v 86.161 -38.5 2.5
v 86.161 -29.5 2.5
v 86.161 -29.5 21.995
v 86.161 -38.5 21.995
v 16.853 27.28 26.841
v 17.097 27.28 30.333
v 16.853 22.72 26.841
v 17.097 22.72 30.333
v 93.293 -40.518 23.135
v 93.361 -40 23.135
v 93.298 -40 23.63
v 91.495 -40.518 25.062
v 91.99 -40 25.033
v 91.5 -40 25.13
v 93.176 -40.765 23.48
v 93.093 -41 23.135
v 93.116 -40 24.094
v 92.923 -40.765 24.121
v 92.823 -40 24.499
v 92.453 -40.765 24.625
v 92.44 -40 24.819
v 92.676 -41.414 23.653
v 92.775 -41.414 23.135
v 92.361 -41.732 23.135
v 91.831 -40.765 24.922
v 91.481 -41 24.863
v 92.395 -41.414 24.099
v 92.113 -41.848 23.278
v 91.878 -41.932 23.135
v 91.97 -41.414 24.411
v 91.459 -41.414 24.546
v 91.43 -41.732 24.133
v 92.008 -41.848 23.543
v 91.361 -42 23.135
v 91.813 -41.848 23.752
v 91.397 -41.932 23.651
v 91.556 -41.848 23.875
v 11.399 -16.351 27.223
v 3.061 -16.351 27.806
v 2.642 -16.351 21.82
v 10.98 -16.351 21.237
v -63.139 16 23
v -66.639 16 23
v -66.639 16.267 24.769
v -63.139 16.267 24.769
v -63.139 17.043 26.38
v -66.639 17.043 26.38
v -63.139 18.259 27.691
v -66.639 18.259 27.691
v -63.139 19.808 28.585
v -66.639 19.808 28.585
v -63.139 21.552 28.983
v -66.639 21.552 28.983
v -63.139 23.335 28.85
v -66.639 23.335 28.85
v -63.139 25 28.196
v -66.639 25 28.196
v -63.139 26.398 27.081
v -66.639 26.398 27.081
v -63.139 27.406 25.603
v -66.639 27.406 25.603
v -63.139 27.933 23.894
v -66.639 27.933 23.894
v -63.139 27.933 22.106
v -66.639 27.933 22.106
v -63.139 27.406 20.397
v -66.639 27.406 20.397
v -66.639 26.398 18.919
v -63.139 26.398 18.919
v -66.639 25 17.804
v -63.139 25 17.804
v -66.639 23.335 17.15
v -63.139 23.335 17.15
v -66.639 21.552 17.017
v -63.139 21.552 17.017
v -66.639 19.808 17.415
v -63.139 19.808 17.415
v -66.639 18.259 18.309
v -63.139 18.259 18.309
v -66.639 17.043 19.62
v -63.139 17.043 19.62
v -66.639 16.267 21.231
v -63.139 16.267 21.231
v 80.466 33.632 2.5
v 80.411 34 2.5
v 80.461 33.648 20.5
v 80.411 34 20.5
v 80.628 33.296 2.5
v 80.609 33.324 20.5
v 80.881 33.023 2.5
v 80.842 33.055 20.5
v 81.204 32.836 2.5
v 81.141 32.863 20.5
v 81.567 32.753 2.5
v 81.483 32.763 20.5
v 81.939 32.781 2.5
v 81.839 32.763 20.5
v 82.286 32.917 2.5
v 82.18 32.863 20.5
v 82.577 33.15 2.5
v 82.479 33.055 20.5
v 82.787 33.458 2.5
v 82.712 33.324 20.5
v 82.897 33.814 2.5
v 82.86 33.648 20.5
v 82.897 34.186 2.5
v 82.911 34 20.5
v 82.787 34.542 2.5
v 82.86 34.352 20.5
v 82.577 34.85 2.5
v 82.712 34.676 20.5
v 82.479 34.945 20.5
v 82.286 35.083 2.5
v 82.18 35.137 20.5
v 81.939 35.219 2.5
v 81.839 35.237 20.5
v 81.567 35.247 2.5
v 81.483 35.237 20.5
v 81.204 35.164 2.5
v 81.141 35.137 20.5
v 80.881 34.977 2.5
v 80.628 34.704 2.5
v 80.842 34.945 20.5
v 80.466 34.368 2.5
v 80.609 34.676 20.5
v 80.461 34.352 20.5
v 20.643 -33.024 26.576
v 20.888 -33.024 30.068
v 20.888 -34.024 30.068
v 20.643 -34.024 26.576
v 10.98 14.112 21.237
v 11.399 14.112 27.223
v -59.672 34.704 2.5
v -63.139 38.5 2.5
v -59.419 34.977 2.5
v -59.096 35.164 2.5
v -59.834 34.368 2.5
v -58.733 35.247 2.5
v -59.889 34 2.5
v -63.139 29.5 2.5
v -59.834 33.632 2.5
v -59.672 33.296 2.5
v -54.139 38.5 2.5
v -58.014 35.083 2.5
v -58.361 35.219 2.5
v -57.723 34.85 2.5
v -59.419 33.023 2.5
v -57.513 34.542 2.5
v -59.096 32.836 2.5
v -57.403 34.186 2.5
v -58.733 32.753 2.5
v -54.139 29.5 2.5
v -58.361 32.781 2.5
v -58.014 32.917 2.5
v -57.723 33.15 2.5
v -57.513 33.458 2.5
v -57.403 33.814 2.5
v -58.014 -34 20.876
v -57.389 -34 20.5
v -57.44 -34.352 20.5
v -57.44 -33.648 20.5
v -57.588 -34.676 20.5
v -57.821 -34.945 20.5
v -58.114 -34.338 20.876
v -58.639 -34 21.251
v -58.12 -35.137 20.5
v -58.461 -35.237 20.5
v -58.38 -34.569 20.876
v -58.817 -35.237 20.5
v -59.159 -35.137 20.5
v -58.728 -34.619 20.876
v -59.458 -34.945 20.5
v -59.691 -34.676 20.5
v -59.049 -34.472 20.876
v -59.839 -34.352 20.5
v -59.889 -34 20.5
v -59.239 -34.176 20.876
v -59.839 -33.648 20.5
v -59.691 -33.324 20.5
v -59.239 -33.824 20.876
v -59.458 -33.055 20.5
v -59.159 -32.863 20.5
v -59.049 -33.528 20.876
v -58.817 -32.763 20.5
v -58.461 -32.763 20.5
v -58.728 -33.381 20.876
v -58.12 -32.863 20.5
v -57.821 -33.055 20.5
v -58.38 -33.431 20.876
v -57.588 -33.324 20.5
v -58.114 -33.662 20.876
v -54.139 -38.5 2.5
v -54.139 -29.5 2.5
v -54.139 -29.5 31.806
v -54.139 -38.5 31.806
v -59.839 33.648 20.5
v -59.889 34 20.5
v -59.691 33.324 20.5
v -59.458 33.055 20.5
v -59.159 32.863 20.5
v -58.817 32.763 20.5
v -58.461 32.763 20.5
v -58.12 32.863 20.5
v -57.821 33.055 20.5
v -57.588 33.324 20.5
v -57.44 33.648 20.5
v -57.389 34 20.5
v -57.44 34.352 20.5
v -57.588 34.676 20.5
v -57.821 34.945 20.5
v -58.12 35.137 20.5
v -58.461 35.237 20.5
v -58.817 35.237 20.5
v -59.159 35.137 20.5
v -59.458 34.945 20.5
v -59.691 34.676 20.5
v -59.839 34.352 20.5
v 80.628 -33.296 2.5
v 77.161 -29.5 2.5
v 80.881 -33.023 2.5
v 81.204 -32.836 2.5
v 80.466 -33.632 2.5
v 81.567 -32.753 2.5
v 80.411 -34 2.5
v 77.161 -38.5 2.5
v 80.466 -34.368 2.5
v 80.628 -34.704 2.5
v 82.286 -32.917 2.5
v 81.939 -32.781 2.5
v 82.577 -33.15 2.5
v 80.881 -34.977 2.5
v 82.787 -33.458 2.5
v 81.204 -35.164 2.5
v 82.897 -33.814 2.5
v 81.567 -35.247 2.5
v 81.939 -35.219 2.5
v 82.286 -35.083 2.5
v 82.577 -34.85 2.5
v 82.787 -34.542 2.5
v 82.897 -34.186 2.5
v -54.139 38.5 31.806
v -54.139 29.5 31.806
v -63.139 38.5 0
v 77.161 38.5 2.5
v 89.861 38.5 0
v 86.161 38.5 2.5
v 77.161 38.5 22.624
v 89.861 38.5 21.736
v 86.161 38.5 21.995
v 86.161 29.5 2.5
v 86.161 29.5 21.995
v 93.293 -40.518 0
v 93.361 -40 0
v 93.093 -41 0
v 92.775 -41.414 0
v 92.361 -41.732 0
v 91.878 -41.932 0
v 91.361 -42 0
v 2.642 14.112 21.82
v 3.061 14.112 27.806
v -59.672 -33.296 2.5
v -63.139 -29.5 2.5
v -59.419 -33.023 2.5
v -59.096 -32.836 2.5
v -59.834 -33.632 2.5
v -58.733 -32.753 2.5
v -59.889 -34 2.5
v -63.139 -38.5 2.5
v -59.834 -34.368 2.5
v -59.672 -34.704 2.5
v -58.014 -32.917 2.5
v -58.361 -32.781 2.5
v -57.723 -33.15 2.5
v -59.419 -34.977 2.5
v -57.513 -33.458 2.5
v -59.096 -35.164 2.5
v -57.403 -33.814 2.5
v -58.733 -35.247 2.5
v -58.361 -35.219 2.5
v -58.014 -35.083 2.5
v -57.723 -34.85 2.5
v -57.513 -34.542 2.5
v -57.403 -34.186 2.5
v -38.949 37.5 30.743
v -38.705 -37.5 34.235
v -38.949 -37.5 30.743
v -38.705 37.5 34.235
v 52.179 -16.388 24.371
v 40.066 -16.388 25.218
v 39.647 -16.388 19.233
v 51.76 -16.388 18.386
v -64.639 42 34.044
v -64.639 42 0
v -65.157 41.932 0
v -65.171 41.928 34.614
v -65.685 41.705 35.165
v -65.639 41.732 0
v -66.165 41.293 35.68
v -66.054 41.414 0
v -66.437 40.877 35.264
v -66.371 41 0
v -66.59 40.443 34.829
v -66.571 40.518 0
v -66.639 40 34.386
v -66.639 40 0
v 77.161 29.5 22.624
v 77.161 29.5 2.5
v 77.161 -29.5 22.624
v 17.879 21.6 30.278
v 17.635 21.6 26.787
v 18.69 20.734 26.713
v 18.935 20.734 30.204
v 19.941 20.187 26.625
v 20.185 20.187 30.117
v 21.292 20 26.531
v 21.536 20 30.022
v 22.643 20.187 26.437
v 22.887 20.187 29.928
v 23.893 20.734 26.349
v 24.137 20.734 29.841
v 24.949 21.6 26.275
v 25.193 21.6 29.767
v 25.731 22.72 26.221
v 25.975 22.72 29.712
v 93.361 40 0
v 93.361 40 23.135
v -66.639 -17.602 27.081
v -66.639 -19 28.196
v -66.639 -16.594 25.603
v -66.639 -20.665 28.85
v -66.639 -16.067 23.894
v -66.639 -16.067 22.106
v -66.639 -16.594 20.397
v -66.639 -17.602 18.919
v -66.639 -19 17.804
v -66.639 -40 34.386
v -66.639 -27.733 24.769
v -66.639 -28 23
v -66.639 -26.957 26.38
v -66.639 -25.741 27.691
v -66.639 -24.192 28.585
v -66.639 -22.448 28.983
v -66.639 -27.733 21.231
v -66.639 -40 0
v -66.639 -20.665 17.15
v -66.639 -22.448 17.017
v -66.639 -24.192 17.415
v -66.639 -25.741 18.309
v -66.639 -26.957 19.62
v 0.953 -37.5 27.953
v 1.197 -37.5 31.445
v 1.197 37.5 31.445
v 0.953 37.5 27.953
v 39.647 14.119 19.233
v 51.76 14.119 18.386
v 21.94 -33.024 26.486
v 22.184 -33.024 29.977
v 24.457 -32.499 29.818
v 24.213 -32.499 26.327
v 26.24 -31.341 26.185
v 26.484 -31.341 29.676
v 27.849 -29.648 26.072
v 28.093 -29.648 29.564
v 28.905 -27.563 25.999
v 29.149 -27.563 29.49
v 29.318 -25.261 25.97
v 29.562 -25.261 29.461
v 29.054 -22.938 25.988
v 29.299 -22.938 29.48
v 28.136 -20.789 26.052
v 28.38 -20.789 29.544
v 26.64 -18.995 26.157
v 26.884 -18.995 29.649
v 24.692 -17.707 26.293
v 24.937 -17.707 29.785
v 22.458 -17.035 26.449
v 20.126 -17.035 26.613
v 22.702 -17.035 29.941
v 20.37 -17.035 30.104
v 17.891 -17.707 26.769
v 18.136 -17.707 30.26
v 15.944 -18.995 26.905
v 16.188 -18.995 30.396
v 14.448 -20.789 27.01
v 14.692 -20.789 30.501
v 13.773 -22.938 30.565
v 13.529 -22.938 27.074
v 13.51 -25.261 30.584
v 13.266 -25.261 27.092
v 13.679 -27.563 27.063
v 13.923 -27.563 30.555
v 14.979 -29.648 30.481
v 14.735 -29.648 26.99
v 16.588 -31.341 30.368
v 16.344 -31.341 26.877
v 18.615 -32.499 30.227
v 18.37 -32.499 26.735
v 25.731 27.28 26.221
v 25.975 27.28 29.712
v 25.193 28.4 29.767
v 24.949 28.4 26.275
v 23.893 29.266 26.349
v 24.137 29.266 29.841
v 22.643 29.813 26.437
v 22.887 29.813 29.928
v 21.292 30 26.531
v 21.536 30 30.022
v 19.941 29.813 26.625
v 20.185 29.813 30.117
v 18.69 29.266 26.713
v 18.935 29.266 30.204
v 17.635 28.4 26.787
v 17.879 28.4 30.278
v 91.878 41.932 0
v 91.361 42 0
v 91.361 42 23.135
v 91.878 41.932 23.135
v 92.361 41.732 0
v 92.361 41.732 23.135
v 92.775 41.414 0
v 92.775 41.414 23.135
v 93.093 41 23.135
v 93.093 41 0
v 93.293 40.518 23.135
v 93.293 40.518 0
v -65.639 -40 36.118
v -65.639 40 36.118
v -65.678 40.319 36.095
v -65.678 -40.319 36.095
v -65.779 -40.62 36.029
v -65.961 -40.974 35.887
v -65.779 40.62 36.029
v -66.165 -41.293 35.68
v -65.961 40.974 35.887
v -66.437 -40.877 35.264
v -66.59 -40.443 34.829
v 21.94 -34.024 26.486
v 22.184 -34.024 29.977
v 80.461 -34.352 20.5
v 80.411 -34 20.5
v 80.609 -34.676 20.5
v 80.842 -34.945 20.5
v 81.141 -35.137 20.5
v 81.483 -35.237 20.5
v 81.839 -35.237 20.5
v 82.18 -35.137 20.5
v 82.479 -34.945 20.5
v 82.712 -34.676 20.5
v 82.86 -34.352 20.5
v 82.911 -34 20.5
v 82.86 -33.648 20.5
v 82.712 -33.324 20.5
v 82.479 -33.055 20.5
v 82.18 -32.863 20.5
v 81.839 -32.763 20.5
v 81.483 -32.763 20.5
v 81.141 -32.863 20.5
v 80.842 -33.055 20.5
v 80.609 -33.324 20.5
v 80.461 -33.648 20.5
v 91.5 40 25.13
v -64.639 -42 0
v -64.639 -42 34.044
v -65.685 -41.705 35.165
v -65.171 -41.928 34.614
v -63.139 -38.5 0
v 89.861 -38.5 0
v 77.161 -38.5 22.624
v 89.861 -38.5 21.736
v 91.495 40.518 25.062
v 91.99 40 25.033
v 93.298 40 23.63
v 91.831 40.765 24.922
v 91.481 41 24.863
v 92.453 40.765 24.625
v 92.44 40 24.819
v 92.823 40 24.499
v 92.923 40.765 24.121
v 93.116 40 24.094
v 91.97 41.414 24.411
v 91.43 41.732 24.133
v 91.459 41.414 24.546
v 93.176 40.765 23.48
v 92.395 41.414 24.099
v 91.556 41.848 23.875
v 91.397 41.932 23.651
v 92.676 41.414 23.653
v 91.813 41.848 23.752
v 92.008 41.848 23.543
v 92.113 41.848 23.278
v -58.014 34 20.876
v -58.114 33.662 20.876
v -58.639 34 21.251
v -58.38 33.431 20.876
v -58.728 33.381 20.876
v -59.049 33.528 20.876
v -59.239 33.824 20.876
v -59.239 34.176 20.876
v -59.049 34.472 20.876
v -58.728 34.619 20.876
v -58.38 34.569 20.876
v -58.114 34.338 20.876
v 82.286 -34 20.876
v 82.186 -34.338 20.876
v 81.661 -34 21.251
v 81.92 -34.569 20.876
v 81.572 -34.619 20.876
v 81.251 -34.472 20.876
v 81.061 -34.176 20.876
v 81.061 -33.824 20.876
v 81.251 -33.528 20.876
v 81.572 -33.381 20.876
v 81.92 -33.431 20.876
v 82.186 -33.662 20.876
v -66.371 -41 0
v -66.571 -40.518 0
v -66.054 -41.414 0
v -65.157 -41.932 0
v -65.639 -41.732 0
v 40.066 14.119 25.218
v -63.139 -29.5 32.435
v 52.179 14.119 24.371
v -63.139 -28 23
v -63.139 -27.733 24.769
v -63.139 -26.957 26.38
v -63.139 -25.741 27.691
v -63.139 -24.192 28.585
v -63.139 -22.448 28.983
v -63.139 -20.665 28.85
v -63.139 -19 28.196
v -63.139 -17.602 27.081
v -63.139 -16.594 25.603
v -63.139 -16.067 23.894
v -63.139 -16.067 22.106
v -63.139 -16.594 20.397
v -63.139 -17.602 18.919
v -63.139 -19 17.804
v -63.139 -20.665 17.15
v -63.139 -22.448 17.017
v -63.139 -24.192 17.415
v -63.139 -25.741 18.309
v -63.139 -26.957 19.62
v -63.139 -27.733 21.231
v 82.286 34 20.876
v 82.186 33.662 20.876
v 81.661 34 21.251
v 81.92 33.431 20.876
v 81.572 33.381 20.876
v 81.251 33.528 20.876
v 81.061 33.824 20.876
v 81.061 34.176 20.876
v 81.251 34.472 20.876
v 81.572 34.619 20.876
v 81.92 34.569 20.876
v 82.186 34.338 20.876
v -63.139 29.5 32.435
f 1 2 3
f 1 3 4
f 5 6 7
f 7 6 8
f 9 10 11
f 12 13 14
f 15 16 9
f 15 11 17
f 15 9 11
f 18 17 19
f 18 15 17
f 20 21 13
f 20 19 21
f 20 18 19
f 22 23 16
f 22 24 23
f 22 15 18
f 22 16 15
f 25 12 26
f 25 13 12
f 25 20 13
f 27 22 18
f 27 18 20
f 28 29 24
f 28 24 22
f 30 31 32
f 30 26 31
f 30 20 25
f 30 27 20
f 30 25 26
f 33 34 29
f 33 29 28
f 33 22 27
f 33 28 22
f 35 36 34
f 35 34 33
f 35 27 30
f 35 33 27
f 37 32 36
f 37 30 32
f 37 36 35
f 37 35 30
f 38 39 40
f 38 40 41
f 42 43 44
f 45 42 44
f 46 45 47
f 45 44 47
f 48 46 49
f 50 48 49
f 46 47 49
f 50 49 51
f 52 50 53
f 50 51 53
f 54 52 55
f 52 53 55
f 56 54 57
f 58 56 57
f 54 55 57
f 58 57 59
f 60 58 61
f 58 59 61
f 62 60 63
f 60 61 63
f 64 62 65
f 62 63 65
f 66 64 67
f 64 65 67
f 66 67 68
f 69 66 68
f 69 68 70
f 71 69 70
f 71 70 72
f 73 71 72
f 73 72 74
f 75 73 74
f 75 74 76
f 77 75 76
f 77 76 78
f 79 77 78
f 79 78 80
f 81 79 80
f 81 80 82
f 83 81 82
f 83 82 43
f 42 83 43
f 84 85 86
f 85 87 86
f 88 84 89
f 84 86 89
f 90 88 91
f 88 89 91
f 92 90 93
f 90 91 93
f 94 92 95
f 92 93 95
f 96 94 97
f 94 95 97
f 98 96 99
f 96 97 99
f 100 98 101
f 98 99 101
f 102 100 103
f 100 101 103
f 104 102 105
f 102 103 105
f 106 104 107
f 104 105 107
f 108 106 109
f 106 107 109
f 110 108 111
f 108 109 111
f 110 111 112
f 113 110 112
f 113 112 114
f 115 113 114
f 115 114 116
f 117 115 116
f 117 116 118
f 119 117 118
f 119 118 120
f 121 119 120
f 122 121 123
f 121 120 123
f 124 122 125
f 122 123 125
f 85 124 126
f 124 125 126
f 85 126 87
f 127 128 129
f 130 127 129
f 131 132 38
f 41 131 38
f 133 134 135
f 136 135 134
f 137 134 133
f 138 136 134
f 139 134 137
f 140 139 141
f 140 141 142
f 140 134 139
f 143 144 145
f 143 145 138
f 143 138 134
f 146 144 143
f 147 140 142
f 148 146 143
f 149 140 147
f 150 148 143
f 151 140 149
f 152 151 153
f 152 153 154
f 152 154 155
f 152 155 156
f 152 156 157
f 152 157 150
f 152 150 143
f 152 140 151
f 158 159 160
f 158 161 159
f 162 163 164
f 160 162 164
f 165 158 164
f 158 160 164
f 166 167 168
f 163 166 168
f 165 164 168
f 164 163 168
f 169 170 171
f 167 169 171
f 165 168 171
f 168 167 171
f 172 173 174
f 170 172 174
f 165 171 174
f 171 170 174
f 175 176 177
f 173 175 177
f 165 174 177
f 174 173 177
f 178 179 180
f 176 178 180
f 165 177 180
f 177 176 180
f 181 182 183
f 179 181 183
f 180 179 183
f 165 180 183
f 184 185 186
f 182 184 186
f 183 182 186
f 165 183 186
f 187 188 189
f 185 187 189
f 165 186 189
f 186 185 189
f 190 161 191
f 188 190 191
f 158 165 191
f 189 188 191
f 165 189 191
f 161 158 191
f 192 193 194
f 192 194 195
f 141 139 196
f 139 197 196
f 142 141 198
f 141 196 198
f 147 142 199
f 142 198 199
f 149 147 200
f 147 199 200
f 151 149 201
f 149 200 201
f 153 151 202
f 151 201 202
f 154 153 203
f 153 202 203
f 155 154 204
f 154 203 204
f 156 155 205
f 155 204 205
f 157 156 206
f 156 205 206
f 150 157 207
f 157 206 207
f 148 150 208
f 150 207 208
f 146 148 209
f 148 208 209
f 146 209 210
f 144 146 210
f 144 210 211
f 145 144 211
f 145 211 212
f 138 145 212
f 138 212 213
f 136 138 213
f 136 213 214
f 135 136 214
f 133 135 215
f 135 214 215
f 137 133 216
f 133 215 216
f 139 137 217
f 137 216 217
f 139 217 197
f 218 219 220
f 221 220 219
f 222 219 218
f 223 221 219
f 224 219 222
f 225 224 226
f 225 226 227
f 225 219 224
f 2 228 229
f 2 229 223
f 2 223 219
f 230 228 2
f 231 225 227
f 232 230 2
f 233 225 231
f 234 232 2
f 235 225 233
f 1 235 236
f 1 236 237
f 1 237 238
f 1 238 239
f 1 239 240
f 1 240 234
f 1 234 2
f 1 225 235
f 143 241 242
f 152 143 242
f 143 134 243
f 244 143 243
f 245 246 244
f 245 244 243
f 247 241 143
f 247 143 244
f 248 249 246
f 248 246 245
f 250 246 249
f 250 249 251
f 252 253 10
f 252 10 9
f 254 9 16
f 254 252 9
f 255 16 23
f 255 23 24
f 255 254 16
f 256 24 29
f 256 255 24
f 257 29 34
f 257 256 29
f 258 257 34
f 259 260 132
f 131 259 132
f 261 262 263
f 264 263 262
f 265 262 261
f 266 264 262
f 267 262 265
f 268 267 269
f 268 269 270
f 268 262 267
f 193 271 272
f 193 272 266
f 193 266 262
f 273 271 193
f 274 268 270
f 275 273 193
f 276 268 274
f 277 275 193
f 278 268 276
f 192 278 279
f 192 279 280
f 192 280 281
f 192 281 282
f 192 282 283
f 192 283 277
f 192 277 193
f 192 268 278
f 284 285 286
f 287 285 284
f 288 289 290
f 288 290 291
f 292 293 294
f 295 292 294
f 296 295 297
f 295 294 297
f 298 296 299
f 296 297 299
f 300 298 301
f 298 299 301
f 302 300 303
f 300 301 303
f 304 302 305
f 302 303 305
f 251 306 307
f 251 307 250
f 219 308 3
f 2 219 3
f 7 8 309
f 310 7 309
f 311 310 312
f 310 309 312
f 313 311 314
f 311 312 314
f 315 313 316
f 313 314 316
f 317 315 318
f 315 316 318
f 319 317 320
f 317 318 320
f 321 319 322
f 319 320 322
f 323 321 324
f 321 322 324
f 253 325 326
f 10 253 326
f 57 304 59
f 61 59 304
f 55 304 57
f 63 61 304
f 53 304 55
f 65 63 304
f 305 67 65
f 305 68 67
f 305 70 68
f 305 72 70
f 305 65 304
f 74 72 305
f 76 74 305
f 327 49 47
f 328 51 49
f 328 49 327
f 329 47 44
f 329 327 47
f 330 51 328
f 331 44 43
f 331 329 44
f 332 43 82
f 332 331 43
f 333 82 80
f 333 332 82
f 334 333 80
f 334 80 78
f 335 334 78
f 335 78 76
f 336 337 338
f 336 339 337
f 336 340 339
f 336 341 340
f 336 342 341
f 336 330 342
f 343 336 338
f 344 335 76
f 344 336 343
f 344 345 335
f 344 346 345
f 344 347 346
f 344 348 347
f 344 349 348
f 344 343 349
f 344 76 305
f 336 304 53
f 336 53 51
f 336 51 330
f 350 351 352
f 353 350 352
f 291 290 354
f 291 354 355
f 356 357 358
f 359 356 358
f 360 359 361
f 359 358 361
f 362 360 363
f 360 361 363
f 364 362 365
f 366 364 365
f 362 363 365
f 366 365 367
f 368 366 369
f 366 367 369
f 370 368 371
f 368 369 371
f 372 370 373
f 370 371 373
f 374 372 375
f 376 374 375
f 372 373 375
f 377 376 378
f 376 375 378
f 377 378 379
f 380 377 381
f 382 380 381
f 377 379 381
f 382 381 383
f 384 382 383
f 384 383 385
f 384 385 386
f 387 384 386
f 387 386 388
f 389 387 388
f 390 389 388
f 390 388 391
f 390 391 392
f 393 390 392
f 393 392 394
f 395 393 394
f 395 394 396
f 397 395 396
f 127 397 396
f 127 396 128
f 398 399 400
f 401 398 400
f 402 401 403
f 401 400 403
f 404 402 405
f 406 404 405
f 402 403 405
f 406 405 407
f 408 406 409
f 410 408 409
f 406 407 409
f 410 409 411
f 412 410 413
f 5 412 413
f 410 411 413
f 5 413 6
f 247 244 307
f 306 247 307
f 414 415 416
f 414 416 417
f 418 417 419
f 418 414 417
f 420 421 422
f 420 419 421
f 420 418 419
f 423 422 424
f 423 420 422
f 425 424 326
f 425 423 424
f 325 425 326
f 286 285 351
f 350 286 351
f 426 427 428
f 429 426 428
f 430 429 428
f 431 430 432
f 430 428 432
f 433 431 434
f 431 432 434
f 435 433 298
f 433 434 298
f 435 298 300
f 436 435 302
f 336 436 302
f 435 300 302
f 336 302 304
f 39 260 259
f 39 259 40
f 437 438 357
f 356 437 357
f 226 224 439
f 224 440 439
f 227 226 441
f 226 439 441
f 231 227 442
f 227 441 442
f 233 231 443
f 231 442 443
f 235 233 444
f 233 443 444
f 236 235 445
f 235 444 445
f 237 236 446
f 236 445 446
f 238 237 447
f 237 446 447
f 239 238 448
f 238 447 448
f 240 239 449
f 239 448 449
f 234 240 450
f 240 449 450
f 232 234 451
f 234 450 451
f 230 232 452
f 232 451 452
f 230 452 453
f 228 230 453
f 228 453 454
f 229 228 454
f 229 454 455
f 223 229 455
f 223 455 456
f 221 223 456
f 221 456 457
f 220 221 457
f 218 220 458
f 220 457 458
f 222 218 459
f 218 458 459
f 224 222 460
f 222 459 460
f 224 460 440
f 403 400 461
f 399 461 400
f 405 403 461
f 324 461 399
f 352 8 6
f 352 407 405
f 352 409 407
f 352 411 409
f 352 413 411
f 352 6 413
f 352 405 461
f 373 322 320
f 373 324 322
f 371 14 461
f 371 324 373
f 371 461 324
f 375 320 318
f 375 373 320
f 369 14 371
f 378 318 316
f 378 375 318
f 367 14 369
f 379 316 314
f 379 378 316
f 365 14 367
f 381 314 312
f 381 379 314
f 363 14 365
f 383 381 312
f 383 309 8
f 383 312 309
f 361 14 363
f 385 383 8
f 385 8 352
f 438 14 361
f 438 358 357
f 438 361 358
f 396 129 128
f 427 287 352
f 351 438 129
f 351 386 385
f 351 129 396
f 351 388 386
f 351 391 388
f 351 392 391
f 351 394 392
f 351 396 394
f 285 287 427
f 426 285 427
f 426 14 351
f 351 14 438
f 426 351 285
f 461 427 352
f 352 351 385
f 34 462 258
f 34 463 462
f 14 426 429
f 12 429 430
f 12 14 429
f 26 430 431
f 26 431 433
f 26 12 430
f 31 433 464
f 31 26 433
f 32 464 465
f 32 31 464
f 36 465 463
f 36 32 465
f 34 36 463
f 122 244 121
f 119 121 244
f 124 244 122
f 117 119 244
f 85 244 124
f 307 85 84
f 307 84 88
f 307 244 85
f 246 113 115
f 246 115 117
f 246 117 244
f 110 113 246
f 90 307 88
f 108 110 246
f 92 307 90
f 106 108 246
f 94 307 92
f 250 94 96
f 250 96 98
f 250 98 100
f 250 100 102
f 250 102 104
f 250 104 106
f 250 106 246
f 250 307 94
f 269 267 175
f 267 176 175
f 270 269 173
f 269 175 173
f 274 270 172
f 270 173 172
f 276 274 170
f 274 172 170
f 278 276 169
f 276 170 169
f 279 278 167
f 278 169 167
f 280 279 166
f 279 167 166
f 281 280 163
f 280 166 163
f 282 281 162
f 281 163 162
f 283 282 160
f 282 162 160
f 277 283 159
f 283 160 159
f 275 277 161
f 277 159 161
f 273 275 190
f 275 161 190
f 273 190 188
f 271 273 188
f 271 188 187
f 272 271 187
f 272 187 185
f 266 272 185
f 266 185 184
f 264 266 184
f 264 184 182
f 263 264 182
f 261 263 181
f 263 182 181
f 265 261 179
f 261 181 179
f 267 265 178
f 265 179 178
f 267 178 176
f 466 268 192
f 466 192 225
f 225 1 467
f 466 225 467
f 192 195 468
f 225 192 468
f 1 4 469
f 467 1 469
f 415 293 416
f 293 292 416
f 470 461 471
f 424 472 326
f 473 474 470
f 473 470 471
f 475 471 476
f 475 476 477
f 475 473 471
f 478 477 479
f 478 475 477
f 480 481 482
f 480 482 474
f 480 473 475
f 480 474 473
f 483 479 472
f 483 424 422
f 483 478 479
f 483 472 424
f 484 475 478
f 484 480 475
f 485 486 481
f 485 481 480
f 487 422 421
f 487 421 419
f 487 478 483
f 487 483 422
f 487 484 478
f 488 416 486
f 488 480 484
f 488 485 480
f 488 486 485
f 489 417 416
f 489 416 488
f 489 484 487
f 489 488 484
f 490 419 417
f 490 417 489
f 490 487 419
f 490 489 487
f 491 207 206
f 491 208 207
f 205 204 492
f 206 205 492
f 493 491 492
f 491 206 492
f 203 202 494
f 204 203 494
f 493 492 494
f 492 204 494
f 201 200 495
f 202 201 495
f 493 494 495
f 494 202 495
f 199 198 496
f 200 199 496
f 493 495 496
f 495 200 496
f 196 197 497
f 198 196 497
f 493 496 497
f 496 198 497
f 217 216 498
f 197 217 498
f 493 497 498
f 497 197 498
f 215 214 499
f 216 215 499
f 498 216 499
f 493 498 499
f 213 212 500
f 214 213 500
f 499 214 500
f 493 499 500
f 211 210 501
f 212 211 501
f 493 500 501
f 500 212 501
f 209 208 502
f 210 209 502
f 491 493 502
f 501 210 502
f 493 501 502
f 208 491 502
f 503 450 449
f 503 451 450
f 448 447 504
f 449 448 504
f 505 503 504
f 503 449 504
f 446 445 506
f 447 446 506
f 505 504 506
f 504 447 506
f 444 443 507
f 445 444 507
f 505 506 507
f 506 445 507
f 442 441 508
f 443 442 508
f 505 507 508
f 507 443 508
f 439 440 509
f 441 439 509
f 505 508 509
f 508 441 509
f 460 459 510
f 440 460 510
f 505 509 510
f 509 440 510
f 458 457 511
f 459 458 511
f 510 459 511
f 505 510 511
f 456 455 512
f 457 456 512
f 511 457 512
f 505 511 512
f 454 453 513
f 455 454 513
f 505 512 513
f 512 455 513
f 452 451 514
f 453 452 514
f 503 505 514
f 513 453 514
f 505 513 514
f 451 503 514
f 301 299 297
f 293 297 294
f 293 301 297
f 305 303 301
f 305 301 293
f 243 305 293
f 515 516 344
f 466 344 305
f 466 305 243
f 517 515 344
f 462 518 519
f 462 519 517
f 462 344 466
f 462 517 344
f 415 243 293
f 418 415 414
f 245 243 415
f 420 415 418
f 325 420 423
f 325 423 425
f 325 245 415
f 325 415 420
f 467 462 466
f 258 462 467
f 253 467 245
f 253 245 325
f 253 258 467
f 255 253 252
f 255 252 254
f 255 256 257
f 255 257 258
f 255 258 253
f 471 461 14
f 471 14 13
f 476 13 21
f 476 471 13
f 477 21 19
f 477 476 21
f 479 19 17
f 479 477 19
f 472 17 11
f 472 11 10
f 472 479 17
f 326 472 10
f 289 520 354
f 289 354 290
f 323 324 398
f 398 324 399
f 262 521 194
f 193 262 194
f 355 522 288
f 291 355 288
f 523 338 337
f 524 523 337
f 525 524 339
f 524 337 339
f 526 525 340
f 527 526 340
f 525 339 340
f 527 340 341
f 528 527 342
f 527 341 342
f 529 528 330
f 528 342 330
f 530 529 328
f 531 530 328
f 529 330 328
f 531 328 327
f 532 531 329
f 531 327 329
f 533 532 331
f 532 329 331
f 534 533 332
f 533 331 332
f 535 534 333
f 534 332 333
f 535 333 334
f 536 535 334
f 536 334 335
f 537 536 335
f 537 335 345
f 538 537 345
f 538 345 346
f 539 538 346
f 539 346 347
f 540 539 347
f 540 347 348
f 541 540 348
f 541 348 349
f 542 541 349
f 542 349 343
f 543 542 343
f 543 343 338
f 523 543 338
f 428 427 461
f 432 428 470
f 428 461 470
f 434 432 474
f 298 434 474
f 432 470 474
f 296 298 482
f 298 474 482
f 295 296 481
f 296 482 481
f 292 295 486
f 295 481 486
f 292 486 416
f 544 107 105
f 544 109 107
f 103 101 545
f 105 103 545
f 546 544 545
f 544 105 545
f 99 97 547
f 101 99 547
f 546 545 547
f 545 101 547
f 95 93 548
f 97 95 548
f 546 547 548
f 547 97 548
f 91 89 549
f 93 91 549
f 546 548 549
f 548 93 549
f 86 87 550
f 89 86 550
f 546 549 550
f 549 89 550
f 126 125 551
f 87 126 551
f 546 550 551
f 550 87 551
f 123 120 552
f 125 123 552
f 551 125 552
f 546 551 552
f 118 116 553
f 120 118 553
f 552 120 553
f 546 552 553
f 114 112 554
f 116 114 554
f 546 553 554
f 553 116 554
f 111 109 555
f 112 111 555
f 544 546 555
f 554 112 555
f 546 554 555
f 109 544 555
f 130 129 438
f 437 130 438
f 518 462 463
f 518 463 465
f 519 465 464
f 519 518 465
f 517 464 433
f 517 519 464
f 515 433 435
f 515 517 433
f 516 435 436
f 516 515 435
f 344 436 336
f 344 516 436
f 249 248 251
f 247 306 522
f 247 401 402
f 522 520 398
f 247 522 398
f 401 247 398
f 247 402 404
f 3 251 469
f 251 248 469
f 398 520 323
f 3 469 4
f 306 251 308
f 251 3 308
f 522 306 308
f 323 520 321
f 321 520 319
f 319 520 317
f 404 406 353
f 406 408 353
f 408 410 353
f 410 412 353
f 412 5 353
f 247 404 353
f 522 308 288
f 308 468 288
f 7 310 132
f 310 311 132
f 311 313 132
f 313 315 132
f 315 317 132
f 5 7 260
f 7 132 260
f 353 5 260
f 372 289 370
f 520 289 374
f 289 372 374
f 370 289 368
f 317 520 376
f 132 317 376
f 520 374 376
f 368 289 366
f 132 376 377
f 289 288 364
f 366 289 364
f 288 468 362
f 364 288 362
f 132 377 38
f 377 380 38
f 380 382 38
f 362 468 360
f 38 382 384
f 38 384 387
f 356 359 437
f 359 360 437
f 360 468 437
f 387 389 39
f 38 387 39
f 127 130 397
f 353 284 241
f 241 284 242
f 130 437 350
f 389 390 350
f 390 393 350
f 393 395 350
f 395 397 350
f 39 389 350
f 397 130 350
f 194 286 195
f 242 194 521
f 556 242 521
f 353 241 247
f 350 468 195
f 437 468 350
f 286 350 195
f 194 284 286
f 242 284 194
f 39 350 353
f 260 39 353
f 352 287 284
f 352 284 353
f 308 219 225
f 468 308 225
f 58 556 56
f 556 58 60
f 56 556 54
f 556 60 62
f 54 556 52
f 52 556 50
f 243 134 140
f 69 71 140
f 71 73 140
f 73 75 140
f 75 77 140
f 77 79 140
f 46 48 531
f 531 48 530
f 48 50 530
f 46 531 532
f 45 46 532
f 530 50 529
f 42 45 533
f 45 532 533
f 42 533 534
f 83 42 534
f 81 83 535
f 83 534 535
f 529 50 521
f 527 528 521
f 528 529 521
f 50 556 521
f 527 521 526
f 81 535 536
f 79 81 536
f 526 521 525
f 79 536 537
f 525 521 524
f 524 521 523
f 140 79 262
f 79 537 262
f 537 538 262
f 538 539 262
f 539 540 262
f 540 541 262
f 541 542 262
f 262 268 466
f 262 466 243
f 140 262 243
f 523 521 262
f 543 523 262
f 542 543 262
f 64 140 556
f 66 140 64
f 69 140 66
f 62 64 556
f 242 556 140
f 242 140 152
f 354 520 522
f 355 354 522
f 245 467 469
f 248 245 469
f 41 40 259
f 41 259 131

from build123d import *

# Parameters (mm, degrees)
F1_DEPTH      = 42
F2_T          = -3.5
F3_W          = 40
F3_H          = 75
F4_DEPTH      = 4
F6_DEPTH      = 5
F8_W          = 9
F8_H          = 9
F9_DEPTH      = 20.5
F10_DEPTH     = 32
F12_R         = 6
F13_DEPTH     = 25
F15_W         = 8.3580343053
F15_H         = 30.4632759653
F15_W_2       = 12.1421813965
F15_H_2       = 30.5070821196
F16_DEPTH     = 6
F17_T1_DEPTH  = 169.3882617949
F17_T3_DEPTH  = 92.6602540378
F17_T5_DEPTH  = 46.118363099
F17_T7_DEPTH  = 35
F18_D         = 2.5
F18_DEPTH     = 18
F18_TIP       = 0.7510757738
F19_T1_DEPTH  = 80
F19_T6_DEPTH  = 2
F19_T12_DEPTH = 2
F20_D         = 2.5
F20_DEPTH     = 18
F20_TIP       = 0.7510757738


# Not quite as in the source:
# - a fillet or chamfer that OpenCascade refuses, or shapes differently, is made with other operations: its cross-section is extruded or revolved along the edge and cut away or added
# - a feature names something its author has since deleted; it is built from what else it names


with BuildPart() as f1:
    # F0 (on Front) → F1 (new body, symmetric)
    with BuildSketch(Plane.XZ):
        Polygon((-66.6393345791, 36.118363099), (-66.6393345791, 0), (93.3606654209, 0), (93.3606654209, 25), (-65.6393345791, 36.118363099), align=None)
    extrude(amount=F1_DEPTH, both=True)

    # F2
    f2_openings = [f1.faces().sort_by_distance(p)[0] for p in [
        (13.360665, 0, 0),
    ]]
    offset(amount=F2_T, openings=f2_openings)

    # F3 (on face) → F4 (cut)
    with BuildSketch(Plane(origin=(2.1939535511, 0, 31.3749975164), x_dir=(0.9975640503, 0, -0.0697564737), z_dir=(0.0697564737, 0, 0.9975640503))):
        with Locations((-20.9989301063, 0)):
            Rectangle(F3_W, F3_H)
    extrude(amount=-F4_DEPTH, mode=Mode.SUBTRACT)

    # F3 (on face) → F6 (cut)
    with BuildSketch(Plane(origin=(2.1939535511, 0, 31.3749975164), x_dir=(0.9975640503, 0, -0.0697564737), z_dir=(0.0697564737, 0, 0.9975640503))):
        with BuildLine():
            Line((14.9393316886, 27.279802623), (14.9393316886, 22.720197377))
            ThreePointArc((14.9393316886, 22.720197377), (19.3893316886, 20), (23.8393316886, 22.720197377))
            Line((23.8393316886, 22.720197377), (23.8393316886, 27.279802623))
            ThreePointArc((23.8393316886, 27.279802623), (19.3893316886, 30), (14.9393316886, 27.279802623))
        make_face()
        with BuildLine():
            Line((20.0393316886, -34.0238362551), (20.0393316886, -33.0238362551))
            ThreePointArc((20.0393316886, -33.0238362551), (19.3893316886, -16.9498789917), (18.7393316886, -33.0238362551))
            Line((18.7393316886, -33.0238362551), (18.7393316886, -34.0238362551))
            Line((18.7393316886, -34.0238362551), (20.0393316886, -34.0238362551))
        make_face()
    extrude(amount=-F6_DEPTH, mode=Mode.SUBTRACT)

    # F8 (on offset) → F9 (join)
    with BuildSketch(Plane(origin=(0, 0, 2.5), x_dir=(1, 0, 0), z_dir=(0, 0, -1))):
        with Locations((81.6606654209, 34)):
            Rectangle(F8_W, F8_H)
        with Locations((81.6606654209, -34)):
            Rectangle(F8_W, F8_H)
    extrude(amount=-F9_DEPTH)

    # F8 (on offset) → F10 (join)
    with BuildSketch(Plane(origin=(0, 0, 2.5), x_dir=(1, 0, 0), z_dir=(0, 0, -1))):
        with Locations((-58.6393345791, -34)):
            Rectangle(F8_W, F8_H)
        with Locations((-58.6393345791, 34)):
            Rectangle(F8_W, F8_H)
    extrude(amount=-F10_DEPTH)

    # F12 (on offset) → F13 (cut)
    with BuildSketch(Plane(origin=(-66.6393345791, 0, 0), x_dir=(0, -1, 0), z_dir=(-1, 0, 0))):
        with Locations((-22, 23)):
            Circle(F12_R)
        with Locations((22, 23)):
            Circle(F12_R)
    extrude(amount=-F13_DEPTH, mode=Mode.SUBTRACT)

    # F15 (on offset) → F16 (join)
    with BuildSketch(Plane(origin=(1.949805893, 0, 27.8835233405), x_dir=(0.9975640503, 0, -0.0697564737), z_dir=(-0.0697564737, 0, -0.9975640503))):
        with Locations((5.292899441, 1.1196539272)):
            Rectangle(F15_W, F15_H)
        with Locations((44.2803874612, 1.1346279643)):
            Rectangle(F15_W_2, F15_H_2)
    extrude(amount=F16_DEPTH)

    # F17: fillet of radius 2 on 7 edges, made by hand

    # F17_s2 → F17_t1 (cut)
    with BuildSketch(Plane(origin=(96.1545321211, 0, -6.7237798852), x_dir=(0, 1, 0), z_dir=(-0.9975640503, 0, 0.0697564737))):
        with BuildLine():
            ThreePointArc((40, -31.4516120627), (41.4142135624, -30.865825625), (42, -29.4516120627))
            Line((42, -29.4516120627), (42, -31.4516120627))
            Line((42, -31.4516120627), (40, -31.4516120627))
        make_face()
        with BuildLine():
            ThreePointArc((-40, -31.4516120627), (-41.4142135624, -30.865825625), (-42, -29.4516120627))
            Line((-42, -29.4516120627), (-42, -31.4516120627))
            Line((-42, -31.4516120627), (-40, -31.4516120627))
        make_face()
    extrude(amount=F17_T1_DEPTH, mode=Mode.SUBTRACT)

    # F17_s4 → F17_t3 (cut)
    with BuildSketch(Plane.XZ.offset(-46.3301270189)):
        with BuildLine():
            ThreePointArc((-65.6393345791, 36.118363099), (-66.3713853867, 35.3863122914), (-66.6393345791, 34.3863122914))
            Line((-66.6393345791, 34.3863122914), (-66.6393345791, 36.118363099))
            Line((-66.6393345791, 36.118363099), (-65.6393345791, 36.118363099))
        make_face()
    extrude(amount=F17_T3_DEPTH, mode=Mode.SUBTRACT)

    # F17_s6 → F17_t5 (cut)
    with BuildSketch(Plane.XY.offset(-5)):
        with BuildLine():
            ThreePointArc((-64.6393345791, 42), (-66.0535481415, 41.4142135624), (-66.6393345791, 40))
            Line((-66.6393345791, 40), (-66.6393345791, 42))
            Line((-66.6393345791, 42), (-64.6393345791, 42))
        make_face()
        with BuildLine():
            ThreePointArc((-64.6393345791, -42), (-66.0535481415, -41.4142135624), (-66.6393345791, -40))
            Line((-66.6393345791, -40), (-66.6393345791, -42))
            Line((-66.6393345791, -42), (-64.6393345791, -42))
        make_face()
    extrude(amount=F17_T5_DEPTH, mode=Mode.SUBTRACT)

    # F17_s8 → F17_t7 (cut)
    with BuildSketch(Plane.XY.offset(-5)):
        with BuildLine():
            ThreePointArc((91.3606654209, 42), (92.7748789833, 41.4142135624), (93.3606654209, 40))
            Line((93.3606654209, 40), (93.3606654209, 42))
            Line((93.3606654209, 42), (91.3606654209, 42))
        make_face()
        with BuildLine():
            ThreePointArc((93.3606654209, -40), (92.7748789833, -41.4142135624), (91.3606654209, -42))
            Line((91.3606654209, -42), (93.3606654209, -42))
            Line((93.3606654209, -42), (93.3606654209, -40))
        make_face()
    extrude(amount=F17_T7_DEPTH, mode=Mode.SUBTRACT)

    # F18
    with Locations(Plane(origin=(0, 0, 2.5), x_dir=(1, 0, 0), z_dir=(0, 0, -1))):
        with Locations((-58.6393345791, 34), (-58.6393345791, -34)):
            Hole(F18_D / 2, depth=F18_DEPTH)
            with Locations((0, 0, -(F18_DEPTH + F18_TIP / 2))):  # 118° drill point
                Cone(0, F18_D / 2, F18_TIP, mode=Mode.SUBTRACT)

    # F19: fillet of radius 2 on 1 edges, made by hand

    # F19_s2 → F19_t1 (cut)
    with BuildSketch(Plane.XZ.offset(-40)):
        with BuildLine():
            ThreePointArc((91.5001783684, 25.1300979282), (92.8233728241, 24.4989665478), (93.3606654209, 23.1349698277))
            Line((93.3606654209, 23.1349698277), (93.3606654209, 25))
            Line((93.3606654209, 25), (91.5001783684, 25.1300979282))
        make_face()
    extrude(amount=F19_T1_DEPTH, mode=Mode.SUBTRACT)


with BuildPart() as f19_tool4:
    # F19_s5 → F19_t6 (new body)
    with BuildSketch(Plane.XZ.offset(40)):
        Polygon((91.3606654209, 23.1349698277), (91.5001783684, 25.1300979282), (93.3606654209, 25), (93.3606654209, 23.1349698277), align=None)
    extrude(amount=F19_T6_DEPTH)

    # F19_s7 → F19_t8 (revolve, cut)
    with BuildSketch(Plane(origin=(91.3606654209, -40, 23.1349698277), x_dir=(-0.7313537016, 0, -0.6819983601), z_dir=(-0.6819983601, 0, 0.7313537016))):
        with BuildLine():
            ThreePointArc((0, -2), (2, 0), (0, 2))
            Line((0, 2), (0, -2))
        make_face()
    revolve(axis=Axis((91.3606654209, -40, 23.1349698277), (0, -1, 0)), mode=Mode.SUBTRACT)


with BuildPart() as f1_1:
    add(f1.part)

    # F19_t3: cut F19_tool4
    add(f19_tool4.part, mode=Mode.SUBTRACT)


with BuildPart() as f19_tool10:
    # F19_s11 → F19_t12 (new body)
    with BuildSketch(Plane.XZ.offset(-40)):
        Polygon((91.3606654209, 23.1349698277), (91.5001783684, 25.1300979282), (93.3606654209, 25), (93.3606654209, 23.1349698277), align=None)
    extrude(amount=-F19_T12_DEPTH)

    # F19_s13 → F19_t14 (revolve, cut)
    with BuildSketch(Plane(origin=(91.3606654209, 40, 23.1349698277), x_dir=(-0.7313537016, 0, -0.6819983601), z_dir=(0.6819983601, 0, -0.7313537016))):
        with BuildLine():
            ThreePointArc((0, -2), (2, 0), (0, 2))
            Line((0, 2), (0, -2))
        make_face()
    revolve(axis=Axis((91.3606654209, 40, 23.1349698277), (0, 1, 0)), mode=Mode.SUBTRACT)


with BuildPart() as f1_2:
    add(f1_1.part)

    # F19_t9: cut F19_tool10
    add(f19_tool10.part, mode=Mode.SUBTRACT)

    # F20
    with Locations(Plane(origin=(0, 0, 2.5), x_dir=(1, 0, 0), z_dir=(0, 0, -1))):
        with Locations((81.6606654209, 34), (81.6606654209, -34)):
            Hole(F20_D / 2, depth=F20_DEPTH)
            with Locations((0, 0, -(F20_DEPTH + F20_TIP / 2))):  # 118° drill point
                Cone(0, F20_D / 2, F20_TIP, mode=Mode.SUBTRACT)


solid = f1_2.part
